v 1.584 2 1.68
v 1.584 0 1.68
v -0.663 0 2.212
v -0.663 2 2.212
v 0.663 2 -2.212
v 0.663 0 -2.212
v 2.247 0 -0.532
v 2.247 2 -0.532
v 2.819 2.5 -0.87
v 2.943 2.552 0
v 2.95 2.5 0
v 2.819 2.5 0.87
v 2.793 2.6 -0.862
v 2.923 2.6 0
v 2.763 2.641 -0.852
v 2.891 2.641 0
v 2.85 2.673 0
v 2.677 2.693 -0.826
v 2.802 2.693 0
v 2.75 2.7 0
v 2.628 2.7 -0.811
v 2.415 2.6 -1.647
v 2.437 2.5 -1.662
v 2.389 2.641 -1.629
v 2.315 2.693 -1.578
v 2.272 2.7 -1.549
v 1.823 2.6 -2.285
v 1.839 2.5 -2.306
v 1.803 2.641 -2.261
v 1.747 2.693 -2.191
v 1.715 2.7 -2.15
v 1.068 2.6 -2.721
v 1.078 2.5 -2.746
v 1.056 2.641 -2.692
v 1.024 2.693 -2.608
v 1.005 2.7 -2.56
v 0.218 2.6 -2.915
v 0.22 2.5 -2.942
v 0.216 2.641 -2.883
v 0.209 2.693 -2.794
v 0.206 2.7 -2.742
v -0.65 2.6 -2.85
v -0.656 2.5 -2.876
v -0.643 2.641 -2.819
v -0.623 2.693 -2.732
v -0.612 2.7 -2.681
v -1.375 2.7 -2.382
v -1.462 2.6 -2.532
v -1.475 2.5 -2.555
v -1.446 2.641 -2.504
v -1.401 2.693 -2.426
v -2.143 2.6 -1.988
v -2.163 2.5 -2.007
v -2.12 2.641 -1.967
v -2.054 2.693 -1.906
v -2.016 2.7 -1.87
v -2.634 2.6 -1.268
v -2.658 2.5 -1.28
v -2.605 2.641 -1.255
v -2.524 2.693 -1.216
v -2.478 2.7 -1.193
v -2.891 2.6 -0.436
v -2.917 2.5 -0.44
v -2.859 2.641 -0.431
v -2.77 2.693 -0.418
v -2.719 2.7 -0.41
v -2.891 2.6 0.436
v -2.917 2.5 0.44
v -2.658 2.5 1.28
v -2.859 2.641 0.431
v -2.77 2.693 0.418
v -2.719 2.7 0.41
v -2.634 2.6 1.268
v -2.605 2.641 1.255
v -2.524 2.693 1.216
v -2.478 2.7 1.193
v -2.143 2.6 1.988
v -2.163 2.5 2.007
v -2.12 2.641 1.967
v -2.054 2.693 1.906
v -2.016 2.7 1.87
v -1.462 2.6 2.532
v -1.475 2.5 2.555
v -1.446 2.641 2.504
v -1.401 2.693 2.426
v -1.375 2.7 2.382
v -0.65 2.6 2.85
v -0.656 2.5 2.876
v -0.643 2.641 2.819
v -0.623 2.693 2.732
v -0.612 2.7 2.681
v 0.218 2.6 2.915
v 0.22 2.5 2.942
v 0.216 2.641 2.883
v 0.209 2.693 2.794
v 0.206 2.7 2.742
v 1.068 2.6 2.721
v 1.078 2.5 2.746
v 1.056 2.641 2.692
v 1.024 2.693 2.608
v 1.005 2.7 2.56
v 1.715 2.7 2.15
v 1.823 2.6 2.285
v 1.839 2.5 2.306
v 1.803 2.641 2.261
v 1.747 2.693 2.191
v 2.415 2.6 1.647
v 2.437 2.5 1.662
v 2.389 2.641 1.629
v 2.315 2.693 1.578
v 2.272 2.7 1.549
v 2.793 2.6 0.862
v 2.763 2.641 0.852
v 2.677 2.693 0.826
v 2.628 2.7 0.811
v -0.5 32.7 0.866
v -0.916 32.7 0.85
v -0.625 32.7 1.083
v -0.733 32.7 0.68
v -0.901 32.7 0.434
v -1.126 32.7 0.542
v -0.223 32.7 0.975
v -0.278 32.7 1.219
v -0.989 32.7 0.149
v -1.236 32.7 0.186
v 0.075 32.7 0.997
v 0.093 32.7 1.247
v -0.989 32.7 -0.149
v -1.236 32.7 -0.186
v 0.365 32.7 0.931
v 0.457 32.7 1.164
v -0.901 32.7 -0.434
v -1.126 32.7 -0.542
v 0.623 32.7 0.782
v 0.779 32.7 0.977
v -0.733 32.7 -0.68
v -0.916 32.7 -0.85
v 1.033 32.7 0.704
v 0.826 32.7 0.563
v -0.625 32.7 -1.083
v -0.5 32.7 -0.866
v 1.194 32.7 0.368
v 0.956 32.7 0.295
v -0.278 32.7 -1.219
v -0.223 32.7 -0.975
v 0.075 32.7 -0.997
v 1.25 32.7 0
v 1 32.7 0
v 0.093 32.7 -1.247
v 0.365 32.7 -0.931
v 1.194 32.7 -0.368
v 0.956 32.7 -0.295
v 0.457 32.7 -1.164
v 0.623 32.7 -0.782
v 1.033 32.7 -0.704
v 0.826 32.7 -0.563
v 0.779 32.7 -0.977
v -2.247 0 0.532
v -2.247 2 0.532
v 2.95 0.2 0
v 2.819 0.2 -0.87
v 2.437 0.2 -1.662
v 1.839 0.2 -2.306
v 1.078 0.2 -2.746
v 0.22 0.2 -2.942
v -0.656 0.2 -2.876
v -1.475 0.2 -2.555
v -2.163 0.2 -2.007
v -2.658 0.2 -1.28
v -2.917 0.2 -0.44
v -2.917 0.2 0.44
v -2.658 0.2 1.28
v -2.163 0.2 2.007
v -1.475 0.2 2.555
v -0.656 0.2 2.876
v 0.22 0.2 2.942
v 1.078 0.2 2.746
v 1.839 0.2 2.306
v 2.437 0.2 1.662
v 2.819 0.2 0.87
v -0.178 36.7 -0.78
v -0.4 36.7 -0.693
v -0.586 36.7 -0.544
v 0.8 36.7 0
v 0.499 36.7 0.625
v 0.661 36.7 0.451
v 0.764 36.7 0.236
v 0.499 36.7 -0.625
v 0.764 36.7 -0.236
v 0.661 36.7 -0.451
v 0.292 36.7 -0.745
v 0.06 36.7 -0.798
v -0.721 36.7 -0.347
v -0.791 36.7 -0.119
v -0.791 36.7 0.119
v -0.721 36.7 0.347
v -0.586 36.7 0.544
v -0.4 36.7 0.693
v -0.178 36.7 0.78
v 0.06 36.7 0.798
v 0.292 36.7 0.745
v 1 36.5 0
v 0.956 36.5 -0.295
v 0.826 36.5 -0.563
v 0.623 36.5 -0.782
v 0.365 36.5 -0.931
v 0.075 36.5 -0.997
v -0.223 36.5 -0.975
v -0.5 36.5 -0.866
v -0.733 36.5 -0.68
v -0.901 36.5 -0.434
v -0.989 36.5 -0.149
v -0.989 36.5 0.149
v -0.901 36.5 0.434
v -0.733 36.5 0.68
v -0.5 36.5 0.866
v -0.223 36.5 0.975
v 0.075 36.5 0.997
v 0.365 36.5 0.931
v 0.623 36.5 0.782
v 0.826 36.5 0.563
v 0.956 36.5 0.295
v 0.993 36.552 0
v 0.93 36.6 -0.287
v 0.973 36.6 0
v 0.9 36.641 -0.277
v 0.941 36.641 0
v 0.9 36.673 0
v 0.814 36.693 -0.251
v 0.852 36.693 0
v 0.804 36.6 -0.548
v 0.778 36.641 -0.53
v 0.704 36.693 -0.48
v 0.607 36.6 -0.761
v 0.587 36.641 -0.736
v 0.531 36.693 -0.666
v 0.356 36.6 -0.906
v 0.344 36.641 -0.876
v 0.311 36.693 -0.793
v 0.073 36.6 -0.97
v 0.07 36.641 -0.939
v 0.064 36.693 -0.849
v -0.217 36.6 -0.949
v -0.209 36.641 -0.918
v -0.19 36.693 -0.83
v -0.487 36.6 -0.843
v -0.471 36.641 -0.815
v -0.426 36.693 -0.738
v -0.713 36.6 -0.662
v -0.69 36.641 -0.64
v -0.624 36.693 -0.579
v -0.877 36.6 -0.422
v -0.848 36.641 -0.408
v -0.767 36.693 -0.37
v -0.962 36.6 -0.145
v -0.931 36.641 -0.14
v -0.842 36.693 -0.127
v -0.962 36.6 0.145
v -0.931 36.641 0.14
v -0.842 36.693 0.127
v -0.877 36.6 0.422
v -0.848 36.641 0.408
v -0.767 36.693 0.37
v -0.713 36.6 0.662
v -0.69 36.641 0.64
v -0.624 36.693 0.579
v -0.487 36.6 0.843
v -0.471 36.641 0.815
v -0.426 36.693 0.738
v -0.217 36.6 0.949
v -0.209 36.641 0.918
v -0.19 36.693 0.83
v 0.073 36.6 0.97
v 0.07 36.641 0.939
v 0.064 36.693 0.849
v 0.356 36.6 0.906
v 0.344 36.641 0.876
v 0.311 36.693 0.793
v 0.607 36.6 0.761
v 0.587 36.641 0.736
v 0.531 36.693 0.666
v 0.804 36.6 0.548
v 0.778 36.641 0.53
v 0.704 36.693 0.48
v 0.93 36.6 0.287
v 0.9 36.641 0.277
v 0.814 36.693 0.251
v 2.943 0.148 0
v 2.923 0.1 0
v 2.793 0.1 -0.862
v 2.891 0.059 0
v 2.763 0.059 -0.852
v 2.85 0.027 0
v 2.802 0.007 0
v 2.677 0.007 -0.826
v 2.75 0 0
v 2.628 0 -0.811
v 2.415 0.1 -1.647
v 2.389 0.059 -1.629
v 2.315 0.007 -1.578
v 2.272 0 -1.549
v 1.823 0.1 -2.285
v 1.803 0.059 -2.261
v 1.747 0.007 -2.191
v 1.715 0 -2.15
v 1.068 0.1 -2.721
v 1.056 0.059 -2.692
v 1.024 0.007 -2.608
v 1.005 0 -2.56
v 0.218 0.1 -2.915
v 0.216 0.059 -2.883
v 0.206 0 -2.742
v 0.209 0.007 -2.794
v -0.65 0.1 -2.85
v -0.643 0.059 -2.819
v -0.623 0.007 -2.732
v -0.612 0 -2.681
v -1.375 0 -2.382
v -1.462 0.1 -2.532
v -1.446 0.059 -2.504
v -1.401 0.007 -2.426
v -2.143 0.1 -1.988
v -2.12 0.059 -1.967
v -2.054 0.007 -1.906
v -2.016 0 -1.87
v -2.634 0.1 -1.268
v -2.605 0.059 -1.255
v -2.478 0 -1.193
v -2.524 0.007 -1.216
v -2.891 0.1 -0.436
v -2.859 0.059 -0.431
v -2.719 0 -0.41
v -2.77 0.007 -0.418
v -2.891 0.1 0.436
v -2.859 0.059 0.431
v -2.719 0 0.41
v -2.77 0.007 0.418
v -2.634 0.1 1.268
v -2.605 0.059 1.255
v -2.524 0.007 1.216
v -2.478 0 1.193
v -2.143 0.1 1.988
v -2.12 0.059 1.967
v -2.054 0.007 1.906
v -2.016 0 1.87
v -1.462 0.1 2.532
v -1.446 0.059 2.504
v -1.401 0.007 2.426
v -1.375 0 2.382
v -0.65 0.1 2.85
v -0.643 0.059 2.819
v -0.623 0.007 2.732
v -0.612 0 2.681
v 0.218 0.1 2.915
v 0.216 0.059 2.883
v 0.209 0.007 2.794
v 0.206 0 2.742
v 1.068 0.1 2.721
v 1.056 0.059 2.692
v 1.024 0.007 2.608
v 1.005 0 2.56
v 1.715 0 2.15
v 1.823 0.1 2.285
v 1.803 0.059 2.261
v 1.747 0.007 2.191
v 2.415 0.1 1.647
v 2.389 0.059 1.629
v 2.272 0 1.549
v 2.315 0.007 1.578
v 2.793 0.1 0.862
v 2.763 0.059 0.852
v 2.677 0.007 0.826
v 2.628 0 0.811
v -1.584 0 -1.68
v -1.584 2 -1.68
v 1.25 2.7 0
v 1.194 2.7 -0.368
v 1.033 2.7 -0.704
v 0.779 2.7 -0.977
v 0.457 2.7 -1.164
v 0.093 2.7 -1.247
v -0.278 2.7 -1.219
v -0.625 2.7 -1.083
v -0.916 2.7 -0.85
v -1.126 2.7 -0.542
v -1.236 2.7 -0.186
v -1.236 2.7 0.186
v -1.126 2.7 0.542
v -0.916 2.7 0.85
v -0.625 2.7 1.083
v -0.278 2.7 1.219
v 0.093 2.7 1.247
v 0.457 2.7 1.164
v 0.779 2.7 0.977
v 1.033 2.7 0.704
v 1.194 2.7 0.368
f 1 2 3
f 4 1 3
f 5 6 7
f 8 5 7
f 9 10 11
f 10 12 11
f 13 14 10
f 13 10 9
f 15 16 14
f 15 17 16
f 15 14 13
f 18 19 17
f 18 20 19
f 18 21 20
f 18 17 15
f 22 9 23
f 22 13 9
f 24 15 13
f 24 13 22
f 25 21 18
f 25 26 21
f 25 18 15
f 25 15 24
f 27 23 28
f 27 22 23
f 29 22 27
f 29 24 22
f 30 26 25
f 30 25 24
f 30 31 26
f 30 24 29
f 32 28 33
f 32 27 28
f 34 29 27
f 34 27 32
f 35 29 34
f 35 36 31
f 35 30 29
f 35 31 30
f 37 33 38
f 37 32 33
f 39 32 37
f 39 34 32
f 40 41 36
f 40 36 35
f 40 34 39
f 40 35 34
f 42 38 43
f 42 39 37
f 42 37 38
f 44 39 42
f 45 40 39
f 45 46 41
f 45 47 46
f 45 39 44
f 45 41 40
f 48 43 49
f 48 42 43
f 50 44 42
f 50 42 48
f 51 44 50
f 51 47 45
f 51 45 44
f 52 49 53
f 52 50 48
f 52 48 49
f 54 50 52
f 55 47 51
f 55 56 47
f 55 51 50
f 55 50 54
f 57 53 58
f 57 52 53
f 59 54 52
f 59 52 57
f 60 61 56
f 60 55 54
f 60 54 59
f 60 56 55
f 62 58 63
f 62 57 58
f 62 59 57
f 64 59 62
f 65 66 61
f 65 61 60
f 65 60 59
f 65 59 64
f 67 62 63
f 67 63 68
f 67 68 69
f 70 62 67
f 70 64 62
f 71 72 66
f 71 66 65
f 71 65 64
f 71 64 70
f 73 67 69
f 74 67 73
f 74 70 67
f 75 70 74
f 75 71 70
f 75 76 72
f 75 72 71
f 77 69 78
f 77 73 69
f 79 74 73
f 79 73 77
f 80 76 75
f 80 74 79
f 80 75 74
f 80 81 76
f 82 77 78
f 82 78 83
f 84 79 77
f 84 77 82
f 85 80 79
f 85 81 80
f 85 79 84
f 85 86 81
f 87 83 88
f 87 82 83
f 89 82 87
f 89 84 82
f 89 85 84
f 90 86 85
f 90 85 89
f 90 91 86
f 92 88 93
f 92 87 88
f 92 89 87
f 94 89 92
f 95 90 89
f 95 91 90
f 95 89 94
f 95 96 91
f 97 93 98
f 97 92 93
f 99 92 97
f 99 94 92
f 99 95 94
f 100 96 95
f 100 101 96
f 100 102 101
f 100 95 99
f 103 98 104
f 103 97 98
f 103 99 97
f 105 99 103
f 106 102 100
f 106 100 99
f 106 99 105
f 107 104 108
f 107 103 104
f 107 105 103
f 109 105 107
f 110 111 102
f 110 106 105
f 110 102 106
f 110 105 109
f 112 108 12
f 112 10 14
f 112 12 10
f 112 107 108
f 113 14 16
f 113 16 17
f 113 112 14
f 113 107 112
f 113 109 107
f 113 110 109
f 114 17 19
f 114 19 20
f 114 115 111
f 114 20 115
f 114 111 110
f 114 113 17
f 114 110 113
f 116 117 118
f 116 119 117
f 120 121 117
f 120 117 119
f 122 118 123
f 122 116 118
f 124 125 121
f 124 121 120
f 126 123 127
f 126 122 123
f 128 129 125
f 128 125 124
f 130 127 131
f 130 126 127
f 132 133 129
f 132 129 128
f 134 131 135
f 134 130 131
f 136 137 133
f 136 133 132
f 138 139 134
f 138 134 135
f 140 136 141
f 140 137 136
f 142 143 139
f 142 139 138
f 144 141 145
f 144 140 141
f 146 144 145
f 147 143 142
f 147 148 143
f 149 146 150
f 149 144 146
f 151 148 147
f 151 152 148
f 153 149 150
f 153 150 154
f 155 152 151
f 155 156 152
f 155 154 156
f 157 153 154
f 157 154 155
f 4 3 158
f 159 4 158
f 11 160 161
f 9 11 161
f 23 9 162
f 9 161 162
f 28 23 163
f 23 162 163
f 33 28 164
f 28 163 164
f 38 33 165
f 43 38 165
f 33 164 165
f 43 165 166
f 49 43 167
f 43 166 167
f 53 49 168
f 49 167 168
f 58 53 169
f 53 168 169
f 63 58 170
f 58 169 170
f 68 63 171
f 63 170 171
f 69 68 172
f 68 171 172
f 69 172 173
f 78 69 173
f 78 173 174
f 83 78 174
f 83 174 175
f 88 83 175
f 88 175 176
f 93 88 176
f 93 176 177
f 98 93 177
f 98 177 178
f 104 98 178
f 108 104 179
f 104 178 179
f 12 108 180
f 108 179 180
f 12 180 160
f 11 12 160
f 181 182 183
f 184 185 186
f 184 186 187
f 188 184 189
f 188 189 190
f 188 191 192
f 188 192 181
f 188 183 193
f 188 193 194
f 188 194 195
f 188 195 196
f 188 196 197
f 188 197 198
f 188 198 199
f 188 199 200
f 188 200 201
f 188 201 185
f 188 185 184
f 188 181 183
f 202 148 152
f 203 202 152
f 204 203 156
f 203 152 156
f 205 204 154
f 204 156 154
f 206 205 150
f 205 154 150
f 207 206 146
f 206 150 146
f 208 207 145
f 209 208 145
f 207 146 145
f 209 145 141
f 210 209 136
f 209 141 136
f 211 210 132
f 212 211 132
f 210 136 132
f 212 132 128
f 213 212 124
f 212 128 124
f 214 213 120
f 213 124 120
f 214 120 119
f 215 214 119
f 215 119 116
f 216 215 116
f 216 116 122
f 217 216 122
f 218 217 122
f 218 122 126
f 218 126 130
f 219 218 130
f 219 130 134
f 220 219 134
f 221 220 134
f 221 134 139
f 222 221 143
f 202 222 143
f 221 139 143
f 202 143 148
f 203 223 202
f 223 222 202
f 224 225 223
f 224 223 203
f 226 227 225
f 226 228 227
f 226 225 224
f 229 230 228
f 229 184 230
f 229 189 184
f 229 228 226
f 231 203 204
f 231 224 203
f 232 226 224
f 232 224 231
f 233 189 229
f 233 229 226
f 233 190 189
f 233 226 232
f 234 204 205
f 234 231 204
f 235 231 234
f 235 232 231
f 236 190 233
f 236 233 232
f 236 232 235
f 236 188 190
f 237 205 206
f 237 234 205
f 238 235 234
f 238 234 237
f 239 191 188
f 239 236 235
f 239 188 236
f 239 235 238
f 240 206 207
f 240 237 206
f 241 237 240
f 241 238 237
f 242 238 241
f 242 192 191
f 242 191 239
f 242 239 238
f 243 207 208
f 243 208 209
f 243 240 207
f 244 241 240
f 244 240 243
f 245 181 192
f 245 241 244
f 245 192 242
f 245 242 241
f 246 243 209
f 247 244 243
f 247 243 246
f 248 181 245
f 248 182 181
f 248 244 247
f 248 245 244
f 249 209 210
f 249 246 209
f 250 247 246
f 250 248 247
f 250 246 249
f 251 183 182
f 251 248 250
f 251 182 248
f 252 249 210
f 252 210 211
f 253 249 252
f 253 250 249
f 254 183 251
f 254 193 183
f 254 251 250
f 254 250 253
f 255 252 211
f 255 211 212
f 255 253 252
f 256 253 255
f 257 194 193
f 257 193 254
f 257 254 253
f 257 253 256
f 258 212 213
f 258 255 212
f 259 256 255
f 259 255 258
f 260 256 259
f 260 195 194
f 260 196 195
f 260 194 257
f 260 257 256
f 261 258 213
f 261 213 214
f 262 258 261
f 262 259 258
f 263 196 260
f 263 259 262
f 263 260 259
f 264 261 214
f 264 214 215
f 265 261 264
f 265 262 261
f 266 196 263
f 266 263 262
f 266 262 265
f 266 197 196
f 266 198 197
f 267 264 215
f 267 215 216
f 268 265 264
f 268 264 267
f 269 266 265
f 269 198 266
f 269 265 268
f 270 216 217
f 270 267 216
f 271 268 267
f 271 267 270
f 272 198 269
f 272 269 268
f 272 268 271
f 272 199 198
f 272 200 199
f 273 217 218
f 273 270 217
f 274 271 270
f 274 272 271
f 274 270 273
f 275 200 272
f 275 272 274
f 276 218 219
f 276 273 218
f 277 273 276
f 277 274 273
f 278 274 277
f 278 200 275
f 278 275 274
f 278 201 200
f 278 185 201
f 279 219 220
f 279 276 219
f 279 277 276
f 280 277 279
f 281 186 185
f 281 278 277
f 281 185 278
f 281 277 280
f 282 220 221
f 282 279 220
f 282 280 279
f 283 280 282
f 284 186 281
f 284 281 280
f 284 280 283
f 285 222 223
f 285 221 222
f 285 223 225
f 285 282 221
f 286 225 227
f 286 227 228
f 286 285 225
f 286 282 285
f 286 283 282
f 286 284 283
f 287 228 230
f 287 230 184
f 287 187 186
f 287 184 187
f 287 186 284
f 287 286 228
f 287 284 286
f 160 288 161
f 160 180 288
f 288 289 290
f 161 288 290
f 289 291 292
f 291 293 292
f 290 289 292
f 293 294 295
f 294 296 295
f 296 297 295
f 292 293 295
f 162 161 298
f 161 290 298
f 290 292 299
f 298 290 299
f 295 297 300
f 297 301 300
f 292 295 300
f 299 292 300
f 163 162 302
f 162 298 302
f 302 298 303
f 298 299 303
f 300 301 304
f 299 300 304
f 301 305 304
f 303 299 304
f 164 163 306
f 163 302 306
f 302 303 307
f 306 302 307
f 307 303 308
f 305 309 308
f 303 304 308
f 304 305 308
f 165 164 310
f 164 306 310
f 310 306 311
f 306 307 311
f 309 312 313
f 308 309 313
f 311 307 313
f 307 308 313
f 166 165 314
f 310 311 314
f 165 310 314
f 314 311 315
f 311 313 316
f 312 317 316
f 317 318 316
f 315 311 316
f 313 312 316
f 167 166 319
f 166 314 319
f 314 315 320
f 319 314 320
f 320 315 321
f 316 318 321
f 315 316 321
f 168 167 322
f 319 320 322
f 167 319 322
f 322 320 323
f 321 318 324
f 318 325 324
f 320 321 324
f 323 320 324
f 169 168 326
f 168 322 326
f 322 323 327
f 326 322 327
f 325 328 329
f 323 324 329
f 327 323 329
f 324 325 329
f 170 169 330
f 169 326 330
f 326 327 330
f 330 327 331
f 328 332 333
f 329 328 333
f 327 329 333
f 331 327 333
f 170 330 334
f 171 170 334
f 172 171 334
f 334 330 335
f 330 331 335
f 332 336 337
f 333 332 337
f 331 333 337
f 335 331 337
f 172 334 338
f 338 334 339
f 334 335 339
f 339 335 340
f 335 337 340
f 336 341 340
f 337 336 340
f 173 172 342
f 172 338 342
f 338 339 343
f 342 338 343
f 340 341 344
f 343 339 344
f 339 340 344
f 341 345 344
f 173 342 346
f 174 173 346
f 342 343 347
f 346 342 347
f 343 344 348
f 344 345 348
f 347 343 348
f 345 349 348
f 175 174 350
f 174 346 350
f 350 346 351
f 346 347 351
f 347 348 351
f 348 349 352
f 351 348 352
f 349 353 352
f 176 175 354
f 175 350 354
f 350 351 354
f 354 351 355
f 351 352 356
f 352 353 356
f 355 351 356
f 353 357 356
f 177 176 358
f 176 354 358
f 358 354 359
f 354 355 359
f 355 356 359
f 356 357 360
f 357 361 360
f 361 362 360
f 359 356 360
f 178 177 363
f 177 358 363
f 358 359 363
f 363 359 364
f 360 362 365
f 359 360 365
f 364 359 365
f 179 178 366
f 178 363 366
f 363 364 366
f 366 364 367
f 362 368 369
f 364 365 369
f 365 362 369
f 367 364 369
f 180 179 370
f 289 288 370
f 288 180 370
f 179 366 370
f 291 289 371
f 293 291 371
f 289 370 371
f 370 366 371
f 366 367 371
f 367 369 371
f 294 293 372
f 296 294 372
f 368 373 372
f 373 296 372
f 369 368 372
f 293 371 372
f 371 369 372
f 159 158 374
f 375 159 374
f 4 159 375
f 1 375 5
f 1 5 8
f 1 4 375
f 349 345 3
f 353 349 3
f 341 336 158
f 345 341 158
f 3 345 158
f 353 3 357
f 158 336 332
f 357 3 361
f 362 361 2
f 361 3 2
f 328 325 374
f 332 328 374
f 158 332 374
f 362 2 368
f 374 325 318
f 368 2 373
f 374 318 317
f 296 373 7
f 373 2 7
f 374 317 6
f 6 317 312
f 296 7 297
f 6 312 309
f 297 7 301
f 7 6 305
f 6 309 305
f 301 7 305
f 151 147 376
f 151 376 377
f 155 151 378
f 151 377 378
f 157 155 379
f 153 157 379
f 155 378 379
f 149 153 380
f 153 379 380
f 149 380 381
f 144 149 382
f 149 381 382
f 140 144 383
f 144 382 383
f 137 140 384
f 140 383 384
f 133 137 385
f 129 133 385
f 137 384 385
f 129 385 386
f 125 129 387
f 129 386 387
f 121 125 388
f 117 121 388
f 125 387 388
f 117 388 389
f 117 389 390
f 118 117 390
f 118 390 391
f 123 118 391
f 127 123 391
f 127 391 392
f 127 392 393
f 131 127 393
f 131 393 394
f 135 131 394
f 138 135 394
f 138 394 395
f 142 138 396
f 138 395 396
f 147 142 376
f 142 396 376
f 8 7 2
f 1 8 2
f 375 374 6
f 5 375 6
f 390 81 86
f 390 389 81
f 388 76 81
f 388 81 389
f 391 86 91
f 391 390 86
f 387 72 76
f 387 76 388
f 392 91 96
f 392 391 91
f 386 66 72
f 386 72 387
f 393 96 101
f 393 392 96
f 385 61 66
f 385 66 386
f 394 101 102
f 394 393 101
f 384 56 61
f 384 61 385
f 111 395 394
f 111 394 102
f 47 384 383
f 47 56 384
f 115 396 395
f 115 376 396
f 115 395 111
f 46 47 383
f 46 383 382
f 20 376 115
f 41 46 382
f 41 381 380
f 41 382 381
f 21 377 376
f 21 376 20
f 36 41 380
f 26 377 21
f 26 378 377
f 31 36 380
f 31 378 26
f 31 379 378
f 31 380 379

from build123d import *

# Parameters (mm, degrees)
SKETCH_1_R          = 2.95
EXTRUDE_1_DEPTH     = 2.7
SKETCH_2_R          = 1.25
EXTRUDE_2_DEPTH     = 30
SKETCH_3_R          = 1
EXTRUDE_3_DEPTH     = 4
CUT_EXTRUDE_1_DEPTH = 2
FILLET_1_R          = 0.2


with BuildPart() as part:
    # 草图1 → 凸台-拉伸1 (new body)
    with BuildSketch(Plane(origin=(0, 0, 0), x_dir=(1, 0, 0), z_dir=(0, 1, 0))):
        Circle(SKETCH_1_R)
    extrude(amount=EXTRUDE_1_DEPTH)

    # 草图2 → 凸台-拉伸2 (add)
    with BuildSketch(Plane(origin=(0, 2.7, 0), x_dir=(1, 0, 0), z_dir=(0, 1, 0))):
        Circle(SKETCH_2_R)
    extrude(amount=EXTRUDE_2_DEPTH)

    # 草图3 → 凸台-拉伸3 (add)
    with BuildSketch(Plane(origin=(0, 32.7, 0), x_dir=(1, 0, 0), z_dir=(0, 1, 0))):
        Circle(SKETCH_3_R)
    extrude(amount=EXTRUDE_3_DEPTH)

    # 草图4 → 切除-拉伸1 (cut)
    with BuildSketch(Plane.XZ):
        Polygon((2.247285488, -0.53201623), (1.584382314, 1.680198207), (-0.662903174, 2.212214437), (-2.247285488, 0.53201623), (-1.584382314, -1.680198207), (0.662903174, -2.212214437), align=None)
    extrude(amount=-CUT_EXTRUDE_1_DEPTH, mode=Mode.SUBTRACT)

    # 圆角1
    fillet_1_edges = [part.edges().sort_by_distance(p)[0] for p in [
        (-1, 36.7, 0),
        (-2.95, 0, 0),
        (-2.95, 2.7, 0),
    ]]
    fillet(fillet_1_edges, radius=FILLET_1_R)


solid = part.part
